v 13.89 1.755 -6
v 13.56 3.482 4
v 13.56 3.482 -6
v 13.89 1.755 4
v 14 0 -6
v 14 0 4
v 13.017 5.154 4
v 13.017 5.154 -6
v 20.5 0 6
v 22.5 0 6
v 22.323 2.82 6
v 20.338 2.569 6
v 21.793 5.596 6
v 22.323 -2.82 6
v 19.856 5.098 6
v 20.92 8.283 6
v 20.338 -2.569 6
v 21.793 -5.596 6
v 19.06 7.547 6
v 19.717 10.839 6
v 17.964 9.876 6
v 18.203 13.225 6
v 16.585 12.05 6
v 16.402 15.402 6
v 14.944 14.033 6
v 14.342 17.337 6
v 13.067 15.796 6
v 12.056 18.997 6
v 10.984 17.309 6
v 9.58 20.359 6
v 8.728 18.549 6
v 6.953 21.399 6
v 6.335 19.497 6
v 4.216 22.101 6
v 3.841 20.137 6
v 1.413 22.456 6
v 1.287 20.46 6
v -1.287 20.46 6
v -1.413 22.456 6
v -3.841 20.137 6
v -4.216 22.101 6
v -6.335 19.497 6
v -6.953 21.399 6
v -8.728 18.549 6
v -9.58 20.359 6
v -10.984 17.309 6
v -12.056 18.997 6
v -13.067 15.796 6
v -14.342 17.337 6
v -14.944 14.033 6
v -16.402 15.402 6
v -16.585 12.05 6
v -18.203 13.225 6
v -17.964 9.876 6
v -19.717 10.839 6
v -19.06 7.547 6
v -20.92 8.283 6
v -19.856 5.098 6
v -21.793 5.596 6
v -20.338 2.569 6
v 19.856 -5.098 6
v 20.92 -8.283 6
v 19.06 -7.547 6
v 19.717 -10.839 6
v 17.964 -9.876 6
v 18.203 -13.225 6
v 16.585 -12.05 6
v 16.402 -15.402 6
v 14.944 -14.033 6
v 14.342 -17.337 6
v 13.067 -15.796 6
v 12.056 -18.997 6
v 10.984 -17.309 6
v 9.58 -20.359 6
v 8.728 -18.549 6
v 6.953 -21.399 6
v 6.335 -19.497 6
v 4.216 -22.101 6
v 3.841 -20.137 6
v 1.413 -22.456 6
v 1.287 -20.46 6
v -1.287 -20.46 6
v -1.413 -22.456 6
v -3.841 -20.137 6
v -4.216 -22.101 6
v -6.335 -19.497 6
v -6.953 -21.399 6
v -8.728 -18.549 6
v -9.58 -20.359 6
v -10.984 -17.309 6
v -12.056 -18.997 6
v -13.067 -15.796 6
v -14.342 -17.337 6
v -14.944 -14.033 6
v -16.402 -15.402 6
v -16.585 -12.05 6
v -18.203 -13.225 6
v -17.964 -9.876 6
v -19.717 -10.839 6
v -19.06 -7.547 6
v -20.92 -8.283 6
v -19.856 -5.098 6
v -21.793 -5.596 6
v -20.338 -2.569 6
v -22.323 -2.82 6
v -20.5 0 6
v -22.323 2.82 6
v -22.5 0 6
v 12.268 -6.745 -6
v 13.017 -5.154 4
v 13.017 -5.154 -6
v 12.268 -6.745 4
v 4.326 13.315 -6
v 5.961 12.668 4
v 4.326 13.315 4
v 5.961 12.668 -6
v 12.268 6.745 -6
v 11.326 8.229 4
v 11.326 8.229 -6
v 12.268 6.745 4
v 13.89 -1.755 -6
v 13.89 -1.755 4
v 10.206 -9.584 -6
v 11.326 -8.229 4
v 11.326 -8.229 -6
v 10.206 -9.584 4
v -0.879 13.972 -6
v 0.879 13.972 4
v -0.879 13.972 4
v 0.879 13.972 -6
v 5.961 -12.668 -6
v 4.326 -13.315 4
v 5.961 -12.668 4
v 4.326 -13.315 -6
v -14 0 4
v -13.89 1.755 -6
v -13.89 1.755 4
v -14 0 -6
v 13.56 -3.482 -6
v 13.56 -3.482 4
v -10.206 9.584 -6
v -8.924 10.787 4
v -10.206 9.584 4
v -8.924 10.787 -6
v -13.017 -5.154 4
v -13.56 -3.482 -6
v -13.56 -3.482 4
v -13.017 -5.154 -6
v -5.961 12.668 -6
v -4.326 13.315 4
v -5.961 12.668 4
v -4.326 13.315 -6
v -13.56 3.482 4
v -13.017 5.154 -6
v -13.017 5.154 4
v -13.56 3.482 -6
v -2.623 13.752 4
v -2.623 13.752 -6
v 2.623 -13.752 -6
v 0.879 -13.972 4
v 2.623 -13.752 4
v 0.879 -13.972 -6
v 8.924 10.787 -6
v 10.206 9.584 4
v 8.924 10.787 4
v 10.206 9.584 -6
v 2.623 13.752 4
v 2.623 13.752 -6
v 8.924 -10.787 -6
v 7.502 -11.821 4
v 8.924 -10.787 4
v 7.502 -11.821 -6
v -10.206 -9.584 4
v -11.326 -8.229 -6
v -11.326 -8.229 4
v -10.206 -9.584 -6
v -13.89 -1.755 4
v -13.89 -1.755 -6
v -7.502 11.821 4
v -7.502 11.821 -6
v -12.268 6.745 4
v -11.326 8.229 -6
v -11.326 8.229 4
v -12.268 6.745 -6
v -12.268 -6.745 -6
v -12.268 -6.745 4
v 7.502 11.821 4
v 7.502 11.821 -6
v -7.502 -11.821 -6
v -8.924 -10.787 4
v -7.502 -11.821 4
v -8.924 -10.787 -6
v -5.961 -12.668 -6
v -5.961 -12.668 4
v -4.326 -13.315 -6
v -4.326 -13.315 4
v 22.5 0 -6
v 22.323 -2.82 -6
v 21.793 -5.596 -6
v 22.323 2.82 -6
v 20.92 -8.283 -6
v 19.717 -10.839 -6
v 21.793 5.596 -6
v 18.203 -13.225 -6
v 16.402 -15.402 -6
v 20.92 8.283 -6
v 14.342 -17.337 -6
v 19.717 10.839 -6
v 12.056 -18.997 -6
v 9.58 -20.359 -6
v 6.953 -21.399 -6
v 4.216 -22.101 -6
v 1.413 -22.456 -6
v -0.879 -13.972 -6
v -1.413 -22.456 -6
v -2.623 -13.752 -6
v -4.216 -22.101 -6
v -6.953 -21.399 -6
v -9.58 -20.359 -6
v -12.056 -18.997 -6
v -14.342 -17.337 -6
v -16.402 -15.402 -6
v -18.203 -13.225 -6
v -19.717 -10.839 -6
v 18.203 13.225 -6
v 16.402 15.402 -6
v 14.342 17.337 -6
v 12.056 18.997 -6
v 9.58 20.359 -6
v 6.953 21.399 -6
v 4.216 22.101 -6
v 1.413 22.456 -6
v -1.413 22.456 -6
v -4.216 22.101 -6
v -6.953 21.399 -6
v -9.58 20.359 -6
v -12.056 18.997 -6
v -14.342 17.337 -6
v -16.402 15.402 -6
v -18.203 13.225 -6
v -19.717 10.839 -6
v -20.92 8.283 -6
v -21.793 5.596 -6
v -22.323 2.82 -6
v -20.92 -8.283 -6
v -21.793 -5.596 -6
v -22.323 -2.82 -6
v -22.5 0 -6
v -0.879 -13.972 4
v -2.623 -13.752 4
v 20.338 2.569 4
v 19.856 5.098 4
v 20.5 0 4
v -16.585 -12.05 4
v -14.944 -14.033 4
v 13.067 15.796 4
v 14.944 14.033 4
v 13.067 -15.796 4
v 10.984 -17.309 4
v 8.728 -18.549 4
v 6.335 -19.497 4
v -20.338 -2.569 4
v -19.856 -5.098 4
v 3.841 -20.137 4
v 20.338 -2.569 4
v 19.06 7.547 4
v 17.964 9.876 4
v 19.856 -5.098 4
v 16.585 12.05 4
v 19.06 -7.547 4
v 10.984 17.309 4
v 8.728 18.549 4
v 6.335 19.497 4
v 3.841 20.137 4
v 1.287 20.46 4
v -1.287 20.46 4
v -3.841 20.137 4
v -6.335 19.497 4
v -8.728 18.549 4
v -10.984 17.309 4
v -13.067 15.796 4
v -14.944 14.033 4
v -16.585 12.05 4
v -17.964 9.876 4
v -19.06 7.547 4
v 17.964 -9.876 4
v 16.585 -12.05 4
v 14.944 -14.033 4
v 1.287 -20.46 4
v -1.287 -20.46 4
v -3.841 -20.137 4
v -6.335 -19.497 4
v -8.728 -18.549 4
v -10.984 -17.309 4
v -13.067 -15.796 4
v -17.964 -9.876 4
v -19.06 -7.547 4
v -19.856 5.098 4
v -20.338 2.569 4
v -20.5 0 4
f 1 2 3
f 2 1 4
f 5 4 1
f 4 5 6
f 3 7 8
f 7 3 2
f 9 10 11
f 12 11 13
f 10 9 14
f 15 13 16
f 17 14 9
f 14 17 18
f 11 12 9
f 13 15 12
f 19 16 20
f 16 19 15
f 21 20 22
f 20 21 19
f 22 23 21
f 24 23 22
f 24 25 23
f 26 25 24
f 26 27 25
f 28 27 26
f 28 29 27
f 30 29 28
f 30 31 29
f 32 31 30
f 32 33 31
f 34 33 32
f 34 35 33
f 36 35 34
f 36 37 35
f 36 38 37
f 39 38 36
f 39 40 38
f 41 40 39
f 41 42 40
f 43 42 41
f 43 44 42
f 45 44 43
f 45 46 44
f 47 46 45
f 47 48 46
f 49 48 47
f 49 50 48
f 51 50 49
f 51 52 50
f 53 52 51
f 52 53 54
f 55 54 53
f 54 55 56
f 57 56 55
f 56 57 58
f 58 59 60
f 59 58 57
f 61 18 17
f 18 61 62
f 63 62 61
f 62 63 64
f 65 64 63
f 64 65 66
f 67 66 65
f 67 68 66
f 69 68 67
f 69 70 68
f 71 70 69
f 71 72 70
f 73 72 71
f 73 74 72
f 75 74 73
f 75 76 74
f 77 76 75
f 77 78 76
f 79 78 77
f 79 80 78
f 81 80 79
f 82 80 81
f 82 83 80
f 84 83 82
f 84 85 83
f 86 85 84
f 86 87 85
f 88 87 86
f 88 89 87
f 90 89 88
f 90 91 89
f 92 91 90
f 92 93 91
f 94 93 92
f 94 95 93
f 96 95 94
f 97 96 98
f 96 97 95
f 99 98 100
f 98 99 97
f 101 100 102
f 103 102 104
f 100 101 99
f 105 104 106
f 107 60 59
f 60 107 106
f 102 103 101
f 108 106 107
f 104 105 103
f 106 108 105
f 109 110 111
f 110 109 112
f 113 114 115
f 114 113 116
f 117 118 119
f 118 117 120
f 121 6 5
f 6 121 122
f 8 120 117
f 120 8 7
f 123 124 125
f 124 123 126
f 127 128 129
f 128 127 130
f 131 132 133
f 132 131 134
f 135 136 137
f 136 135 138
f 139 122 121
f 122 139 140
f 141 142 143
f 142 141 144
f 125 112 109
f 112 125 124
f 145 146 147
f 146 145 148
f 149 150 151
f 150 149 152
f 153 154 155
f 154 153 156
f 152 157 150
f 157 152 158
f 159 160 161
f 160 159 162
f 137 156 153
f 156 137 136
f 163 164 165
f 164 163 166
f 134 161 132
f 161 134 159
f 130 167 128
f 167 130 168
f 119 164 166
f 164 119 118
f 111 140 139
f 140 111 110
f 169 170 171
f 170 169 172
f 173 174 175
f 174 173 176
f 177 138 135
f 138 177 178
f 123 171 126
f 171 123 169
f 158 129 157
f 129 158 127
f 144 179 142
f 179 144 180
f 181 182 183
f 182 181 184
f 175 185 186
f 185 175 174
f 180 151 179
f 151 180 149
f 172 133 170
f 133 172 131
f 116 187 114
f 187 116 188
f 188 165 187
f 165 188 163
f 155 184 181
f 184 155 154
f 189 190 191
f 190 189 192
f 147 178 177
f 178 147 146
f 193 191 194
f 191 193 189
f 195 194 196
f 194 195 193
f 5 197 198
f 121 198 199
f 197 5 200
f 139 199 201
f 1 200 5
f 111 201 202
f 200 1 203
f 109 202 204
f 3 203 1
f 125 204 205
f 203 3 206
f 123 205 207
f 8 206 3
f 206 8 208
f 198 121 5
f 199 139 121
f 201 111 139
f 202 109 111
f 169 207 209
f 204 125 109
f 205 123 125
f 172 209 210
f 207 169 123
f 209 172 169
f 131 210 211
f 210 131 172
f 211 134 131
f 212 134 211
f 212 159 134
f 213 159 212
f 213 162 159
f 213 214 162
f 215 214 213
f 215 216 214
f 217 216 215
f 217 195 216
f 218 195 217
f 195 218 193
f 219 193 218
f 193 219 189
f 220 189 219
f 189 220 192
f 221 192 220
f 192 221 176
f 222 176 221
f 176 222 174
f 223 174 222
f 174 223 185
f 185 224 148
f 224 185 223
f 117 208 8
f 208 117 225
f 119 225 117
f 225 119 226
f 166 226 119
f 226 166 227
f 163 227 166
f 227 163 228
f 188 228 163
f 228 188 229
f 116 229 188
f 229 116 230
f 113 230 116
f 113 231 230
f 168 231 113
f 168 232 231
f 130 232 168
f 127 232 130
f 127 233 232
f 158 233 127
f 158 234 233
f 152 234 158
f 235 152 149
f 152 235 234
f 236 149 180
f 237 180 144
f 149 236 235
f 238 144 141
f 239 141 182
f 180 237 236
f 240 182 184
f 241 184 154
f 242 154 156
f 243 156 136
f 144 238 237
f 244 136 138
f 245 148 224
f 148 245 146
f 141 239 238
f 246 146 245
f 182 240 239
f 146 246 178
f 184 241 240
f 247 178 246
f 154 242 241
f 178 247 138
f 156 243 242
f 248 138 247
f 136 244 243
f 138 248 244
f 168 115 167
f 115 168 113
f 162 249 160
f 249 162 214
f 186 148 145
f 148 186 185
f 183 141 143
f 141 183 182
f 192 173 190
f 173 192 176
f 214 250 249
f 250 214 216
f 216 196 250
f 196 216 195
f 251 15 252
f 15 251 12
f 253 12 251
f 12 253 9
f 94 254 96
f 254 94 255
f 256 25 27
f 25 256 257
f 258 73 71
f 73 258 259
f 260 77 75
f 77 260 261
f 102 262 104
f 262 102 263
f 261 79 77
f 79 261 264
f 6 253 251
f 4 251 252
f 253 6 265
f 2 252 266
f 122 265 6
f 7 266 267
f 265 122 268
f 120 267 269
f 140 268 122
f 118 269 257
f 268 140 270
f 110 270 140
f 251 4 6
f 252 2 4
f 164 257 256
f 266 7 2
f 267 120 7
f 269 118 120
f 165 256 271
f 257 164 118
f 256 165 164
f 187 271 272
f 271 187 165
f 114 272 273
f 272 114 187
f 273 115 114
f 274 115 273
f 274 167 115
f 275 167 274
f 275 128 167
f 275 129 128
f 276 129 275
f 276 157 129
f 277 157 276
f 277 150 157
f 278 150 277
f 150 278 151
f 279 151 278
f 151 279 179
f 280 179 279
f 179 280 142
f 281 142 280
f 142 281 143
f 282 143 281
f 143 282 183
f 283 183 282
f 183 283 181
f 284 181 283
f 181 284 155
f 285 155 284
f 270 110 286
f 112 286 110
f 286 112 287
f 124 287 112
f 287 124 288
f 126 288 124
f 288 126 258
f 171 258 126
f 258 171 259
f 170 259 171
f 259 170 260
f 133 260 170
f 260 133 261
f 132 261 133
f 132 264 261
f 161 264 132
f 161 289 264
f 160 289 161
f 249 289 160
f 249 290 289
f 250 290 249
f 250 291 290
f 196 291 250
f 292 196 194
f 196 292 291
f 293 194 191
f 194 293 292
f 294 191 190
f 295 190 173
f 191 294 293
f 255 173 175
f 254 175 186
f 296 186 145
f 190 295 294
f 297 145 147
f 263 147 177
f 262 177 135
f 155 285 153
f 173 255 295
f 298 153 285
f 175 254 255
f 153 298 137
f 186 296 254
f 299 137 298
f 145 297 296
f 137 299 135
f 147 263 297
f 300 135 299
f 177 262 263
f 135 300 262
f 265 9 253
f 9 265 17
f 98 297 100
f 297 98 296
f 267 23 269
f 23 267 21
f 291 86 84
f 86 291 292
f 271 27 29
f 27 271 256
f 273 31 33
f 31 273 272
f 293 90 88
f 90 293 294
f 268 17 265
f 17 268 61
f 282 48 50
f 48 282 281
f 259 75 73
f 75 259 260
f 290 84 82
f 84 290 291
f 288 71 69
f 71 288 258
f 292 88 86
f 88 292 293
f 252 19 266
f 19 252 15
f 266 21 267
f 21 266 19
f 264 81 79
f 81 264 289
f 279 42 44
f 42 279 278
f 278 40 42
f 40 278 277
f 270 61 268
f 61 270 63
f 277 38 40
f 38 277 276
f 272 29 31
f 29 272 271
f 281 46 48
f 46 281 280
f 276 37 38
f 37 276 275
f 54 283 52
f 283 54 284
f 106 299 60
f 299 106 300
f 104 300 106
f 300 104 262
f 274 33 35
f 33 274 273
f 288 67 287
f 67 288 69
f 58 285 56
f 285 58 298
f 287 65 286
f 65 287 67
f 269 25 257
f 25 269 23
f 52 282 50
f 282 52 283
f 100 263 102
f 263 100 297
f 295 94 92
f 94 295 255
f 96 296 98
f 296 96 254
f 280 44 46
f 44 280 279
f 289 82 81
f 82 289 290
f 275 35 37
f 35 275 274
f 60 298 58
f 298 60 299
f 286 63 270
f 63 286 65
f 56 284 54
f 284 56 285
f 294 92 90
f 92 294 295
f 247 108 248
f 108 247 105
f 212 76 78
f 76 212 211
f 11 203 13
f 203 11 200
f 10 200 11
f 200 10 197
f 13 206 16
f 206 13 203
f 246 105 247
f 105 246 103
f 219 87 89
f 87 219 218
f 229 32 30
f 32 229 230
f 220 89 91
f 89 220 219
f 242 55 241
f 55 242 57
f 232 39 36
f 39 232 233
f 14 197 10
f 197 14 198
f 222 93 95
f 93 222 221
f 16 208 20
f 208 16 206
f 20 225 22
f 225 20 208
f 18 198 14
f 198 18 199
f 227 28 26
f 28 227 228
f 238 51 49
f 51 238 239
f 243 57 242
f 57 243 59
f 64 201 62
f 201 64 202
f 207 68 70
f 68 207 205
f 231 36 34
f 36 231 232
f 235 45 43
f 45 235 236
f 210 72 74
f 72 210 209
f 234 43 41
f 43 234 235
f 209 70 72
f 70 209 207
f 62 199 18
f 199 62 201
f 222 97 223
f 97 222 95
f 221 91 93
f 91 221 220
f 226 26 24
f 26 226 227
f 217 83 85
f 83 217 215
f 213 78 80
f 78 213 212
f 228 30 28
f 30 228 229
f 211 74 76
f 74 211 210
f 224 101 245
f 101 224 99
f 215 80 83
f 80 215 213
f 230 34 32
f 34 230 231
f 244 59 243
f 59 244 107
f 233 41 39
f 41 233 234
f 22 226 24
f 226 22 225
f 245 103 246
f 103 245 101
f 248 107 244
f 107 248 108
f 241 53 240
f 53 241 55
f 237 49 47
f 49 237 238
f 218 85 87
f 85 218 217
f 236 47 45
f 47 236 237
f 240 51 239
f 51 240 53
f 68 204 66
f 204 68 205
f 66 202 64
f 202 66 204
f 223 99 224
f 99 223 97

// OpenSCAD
$fn = 50;


difference() {
	union() {
		translate(v = [0, 0, -6.0000000000]) {
			cylinder(h = 12, r = 22.5000000000);
		}
	}
	union() {
		#translate(v = [0, 0, -6.0000000000]) {
			cylinder(h = 12, r = 14.0000000000);
		}
		translate(v = [0, 0, 4.0000000000]) {
			cylinder(h = 2, r = 20.5000000000);
		}
	}
}
